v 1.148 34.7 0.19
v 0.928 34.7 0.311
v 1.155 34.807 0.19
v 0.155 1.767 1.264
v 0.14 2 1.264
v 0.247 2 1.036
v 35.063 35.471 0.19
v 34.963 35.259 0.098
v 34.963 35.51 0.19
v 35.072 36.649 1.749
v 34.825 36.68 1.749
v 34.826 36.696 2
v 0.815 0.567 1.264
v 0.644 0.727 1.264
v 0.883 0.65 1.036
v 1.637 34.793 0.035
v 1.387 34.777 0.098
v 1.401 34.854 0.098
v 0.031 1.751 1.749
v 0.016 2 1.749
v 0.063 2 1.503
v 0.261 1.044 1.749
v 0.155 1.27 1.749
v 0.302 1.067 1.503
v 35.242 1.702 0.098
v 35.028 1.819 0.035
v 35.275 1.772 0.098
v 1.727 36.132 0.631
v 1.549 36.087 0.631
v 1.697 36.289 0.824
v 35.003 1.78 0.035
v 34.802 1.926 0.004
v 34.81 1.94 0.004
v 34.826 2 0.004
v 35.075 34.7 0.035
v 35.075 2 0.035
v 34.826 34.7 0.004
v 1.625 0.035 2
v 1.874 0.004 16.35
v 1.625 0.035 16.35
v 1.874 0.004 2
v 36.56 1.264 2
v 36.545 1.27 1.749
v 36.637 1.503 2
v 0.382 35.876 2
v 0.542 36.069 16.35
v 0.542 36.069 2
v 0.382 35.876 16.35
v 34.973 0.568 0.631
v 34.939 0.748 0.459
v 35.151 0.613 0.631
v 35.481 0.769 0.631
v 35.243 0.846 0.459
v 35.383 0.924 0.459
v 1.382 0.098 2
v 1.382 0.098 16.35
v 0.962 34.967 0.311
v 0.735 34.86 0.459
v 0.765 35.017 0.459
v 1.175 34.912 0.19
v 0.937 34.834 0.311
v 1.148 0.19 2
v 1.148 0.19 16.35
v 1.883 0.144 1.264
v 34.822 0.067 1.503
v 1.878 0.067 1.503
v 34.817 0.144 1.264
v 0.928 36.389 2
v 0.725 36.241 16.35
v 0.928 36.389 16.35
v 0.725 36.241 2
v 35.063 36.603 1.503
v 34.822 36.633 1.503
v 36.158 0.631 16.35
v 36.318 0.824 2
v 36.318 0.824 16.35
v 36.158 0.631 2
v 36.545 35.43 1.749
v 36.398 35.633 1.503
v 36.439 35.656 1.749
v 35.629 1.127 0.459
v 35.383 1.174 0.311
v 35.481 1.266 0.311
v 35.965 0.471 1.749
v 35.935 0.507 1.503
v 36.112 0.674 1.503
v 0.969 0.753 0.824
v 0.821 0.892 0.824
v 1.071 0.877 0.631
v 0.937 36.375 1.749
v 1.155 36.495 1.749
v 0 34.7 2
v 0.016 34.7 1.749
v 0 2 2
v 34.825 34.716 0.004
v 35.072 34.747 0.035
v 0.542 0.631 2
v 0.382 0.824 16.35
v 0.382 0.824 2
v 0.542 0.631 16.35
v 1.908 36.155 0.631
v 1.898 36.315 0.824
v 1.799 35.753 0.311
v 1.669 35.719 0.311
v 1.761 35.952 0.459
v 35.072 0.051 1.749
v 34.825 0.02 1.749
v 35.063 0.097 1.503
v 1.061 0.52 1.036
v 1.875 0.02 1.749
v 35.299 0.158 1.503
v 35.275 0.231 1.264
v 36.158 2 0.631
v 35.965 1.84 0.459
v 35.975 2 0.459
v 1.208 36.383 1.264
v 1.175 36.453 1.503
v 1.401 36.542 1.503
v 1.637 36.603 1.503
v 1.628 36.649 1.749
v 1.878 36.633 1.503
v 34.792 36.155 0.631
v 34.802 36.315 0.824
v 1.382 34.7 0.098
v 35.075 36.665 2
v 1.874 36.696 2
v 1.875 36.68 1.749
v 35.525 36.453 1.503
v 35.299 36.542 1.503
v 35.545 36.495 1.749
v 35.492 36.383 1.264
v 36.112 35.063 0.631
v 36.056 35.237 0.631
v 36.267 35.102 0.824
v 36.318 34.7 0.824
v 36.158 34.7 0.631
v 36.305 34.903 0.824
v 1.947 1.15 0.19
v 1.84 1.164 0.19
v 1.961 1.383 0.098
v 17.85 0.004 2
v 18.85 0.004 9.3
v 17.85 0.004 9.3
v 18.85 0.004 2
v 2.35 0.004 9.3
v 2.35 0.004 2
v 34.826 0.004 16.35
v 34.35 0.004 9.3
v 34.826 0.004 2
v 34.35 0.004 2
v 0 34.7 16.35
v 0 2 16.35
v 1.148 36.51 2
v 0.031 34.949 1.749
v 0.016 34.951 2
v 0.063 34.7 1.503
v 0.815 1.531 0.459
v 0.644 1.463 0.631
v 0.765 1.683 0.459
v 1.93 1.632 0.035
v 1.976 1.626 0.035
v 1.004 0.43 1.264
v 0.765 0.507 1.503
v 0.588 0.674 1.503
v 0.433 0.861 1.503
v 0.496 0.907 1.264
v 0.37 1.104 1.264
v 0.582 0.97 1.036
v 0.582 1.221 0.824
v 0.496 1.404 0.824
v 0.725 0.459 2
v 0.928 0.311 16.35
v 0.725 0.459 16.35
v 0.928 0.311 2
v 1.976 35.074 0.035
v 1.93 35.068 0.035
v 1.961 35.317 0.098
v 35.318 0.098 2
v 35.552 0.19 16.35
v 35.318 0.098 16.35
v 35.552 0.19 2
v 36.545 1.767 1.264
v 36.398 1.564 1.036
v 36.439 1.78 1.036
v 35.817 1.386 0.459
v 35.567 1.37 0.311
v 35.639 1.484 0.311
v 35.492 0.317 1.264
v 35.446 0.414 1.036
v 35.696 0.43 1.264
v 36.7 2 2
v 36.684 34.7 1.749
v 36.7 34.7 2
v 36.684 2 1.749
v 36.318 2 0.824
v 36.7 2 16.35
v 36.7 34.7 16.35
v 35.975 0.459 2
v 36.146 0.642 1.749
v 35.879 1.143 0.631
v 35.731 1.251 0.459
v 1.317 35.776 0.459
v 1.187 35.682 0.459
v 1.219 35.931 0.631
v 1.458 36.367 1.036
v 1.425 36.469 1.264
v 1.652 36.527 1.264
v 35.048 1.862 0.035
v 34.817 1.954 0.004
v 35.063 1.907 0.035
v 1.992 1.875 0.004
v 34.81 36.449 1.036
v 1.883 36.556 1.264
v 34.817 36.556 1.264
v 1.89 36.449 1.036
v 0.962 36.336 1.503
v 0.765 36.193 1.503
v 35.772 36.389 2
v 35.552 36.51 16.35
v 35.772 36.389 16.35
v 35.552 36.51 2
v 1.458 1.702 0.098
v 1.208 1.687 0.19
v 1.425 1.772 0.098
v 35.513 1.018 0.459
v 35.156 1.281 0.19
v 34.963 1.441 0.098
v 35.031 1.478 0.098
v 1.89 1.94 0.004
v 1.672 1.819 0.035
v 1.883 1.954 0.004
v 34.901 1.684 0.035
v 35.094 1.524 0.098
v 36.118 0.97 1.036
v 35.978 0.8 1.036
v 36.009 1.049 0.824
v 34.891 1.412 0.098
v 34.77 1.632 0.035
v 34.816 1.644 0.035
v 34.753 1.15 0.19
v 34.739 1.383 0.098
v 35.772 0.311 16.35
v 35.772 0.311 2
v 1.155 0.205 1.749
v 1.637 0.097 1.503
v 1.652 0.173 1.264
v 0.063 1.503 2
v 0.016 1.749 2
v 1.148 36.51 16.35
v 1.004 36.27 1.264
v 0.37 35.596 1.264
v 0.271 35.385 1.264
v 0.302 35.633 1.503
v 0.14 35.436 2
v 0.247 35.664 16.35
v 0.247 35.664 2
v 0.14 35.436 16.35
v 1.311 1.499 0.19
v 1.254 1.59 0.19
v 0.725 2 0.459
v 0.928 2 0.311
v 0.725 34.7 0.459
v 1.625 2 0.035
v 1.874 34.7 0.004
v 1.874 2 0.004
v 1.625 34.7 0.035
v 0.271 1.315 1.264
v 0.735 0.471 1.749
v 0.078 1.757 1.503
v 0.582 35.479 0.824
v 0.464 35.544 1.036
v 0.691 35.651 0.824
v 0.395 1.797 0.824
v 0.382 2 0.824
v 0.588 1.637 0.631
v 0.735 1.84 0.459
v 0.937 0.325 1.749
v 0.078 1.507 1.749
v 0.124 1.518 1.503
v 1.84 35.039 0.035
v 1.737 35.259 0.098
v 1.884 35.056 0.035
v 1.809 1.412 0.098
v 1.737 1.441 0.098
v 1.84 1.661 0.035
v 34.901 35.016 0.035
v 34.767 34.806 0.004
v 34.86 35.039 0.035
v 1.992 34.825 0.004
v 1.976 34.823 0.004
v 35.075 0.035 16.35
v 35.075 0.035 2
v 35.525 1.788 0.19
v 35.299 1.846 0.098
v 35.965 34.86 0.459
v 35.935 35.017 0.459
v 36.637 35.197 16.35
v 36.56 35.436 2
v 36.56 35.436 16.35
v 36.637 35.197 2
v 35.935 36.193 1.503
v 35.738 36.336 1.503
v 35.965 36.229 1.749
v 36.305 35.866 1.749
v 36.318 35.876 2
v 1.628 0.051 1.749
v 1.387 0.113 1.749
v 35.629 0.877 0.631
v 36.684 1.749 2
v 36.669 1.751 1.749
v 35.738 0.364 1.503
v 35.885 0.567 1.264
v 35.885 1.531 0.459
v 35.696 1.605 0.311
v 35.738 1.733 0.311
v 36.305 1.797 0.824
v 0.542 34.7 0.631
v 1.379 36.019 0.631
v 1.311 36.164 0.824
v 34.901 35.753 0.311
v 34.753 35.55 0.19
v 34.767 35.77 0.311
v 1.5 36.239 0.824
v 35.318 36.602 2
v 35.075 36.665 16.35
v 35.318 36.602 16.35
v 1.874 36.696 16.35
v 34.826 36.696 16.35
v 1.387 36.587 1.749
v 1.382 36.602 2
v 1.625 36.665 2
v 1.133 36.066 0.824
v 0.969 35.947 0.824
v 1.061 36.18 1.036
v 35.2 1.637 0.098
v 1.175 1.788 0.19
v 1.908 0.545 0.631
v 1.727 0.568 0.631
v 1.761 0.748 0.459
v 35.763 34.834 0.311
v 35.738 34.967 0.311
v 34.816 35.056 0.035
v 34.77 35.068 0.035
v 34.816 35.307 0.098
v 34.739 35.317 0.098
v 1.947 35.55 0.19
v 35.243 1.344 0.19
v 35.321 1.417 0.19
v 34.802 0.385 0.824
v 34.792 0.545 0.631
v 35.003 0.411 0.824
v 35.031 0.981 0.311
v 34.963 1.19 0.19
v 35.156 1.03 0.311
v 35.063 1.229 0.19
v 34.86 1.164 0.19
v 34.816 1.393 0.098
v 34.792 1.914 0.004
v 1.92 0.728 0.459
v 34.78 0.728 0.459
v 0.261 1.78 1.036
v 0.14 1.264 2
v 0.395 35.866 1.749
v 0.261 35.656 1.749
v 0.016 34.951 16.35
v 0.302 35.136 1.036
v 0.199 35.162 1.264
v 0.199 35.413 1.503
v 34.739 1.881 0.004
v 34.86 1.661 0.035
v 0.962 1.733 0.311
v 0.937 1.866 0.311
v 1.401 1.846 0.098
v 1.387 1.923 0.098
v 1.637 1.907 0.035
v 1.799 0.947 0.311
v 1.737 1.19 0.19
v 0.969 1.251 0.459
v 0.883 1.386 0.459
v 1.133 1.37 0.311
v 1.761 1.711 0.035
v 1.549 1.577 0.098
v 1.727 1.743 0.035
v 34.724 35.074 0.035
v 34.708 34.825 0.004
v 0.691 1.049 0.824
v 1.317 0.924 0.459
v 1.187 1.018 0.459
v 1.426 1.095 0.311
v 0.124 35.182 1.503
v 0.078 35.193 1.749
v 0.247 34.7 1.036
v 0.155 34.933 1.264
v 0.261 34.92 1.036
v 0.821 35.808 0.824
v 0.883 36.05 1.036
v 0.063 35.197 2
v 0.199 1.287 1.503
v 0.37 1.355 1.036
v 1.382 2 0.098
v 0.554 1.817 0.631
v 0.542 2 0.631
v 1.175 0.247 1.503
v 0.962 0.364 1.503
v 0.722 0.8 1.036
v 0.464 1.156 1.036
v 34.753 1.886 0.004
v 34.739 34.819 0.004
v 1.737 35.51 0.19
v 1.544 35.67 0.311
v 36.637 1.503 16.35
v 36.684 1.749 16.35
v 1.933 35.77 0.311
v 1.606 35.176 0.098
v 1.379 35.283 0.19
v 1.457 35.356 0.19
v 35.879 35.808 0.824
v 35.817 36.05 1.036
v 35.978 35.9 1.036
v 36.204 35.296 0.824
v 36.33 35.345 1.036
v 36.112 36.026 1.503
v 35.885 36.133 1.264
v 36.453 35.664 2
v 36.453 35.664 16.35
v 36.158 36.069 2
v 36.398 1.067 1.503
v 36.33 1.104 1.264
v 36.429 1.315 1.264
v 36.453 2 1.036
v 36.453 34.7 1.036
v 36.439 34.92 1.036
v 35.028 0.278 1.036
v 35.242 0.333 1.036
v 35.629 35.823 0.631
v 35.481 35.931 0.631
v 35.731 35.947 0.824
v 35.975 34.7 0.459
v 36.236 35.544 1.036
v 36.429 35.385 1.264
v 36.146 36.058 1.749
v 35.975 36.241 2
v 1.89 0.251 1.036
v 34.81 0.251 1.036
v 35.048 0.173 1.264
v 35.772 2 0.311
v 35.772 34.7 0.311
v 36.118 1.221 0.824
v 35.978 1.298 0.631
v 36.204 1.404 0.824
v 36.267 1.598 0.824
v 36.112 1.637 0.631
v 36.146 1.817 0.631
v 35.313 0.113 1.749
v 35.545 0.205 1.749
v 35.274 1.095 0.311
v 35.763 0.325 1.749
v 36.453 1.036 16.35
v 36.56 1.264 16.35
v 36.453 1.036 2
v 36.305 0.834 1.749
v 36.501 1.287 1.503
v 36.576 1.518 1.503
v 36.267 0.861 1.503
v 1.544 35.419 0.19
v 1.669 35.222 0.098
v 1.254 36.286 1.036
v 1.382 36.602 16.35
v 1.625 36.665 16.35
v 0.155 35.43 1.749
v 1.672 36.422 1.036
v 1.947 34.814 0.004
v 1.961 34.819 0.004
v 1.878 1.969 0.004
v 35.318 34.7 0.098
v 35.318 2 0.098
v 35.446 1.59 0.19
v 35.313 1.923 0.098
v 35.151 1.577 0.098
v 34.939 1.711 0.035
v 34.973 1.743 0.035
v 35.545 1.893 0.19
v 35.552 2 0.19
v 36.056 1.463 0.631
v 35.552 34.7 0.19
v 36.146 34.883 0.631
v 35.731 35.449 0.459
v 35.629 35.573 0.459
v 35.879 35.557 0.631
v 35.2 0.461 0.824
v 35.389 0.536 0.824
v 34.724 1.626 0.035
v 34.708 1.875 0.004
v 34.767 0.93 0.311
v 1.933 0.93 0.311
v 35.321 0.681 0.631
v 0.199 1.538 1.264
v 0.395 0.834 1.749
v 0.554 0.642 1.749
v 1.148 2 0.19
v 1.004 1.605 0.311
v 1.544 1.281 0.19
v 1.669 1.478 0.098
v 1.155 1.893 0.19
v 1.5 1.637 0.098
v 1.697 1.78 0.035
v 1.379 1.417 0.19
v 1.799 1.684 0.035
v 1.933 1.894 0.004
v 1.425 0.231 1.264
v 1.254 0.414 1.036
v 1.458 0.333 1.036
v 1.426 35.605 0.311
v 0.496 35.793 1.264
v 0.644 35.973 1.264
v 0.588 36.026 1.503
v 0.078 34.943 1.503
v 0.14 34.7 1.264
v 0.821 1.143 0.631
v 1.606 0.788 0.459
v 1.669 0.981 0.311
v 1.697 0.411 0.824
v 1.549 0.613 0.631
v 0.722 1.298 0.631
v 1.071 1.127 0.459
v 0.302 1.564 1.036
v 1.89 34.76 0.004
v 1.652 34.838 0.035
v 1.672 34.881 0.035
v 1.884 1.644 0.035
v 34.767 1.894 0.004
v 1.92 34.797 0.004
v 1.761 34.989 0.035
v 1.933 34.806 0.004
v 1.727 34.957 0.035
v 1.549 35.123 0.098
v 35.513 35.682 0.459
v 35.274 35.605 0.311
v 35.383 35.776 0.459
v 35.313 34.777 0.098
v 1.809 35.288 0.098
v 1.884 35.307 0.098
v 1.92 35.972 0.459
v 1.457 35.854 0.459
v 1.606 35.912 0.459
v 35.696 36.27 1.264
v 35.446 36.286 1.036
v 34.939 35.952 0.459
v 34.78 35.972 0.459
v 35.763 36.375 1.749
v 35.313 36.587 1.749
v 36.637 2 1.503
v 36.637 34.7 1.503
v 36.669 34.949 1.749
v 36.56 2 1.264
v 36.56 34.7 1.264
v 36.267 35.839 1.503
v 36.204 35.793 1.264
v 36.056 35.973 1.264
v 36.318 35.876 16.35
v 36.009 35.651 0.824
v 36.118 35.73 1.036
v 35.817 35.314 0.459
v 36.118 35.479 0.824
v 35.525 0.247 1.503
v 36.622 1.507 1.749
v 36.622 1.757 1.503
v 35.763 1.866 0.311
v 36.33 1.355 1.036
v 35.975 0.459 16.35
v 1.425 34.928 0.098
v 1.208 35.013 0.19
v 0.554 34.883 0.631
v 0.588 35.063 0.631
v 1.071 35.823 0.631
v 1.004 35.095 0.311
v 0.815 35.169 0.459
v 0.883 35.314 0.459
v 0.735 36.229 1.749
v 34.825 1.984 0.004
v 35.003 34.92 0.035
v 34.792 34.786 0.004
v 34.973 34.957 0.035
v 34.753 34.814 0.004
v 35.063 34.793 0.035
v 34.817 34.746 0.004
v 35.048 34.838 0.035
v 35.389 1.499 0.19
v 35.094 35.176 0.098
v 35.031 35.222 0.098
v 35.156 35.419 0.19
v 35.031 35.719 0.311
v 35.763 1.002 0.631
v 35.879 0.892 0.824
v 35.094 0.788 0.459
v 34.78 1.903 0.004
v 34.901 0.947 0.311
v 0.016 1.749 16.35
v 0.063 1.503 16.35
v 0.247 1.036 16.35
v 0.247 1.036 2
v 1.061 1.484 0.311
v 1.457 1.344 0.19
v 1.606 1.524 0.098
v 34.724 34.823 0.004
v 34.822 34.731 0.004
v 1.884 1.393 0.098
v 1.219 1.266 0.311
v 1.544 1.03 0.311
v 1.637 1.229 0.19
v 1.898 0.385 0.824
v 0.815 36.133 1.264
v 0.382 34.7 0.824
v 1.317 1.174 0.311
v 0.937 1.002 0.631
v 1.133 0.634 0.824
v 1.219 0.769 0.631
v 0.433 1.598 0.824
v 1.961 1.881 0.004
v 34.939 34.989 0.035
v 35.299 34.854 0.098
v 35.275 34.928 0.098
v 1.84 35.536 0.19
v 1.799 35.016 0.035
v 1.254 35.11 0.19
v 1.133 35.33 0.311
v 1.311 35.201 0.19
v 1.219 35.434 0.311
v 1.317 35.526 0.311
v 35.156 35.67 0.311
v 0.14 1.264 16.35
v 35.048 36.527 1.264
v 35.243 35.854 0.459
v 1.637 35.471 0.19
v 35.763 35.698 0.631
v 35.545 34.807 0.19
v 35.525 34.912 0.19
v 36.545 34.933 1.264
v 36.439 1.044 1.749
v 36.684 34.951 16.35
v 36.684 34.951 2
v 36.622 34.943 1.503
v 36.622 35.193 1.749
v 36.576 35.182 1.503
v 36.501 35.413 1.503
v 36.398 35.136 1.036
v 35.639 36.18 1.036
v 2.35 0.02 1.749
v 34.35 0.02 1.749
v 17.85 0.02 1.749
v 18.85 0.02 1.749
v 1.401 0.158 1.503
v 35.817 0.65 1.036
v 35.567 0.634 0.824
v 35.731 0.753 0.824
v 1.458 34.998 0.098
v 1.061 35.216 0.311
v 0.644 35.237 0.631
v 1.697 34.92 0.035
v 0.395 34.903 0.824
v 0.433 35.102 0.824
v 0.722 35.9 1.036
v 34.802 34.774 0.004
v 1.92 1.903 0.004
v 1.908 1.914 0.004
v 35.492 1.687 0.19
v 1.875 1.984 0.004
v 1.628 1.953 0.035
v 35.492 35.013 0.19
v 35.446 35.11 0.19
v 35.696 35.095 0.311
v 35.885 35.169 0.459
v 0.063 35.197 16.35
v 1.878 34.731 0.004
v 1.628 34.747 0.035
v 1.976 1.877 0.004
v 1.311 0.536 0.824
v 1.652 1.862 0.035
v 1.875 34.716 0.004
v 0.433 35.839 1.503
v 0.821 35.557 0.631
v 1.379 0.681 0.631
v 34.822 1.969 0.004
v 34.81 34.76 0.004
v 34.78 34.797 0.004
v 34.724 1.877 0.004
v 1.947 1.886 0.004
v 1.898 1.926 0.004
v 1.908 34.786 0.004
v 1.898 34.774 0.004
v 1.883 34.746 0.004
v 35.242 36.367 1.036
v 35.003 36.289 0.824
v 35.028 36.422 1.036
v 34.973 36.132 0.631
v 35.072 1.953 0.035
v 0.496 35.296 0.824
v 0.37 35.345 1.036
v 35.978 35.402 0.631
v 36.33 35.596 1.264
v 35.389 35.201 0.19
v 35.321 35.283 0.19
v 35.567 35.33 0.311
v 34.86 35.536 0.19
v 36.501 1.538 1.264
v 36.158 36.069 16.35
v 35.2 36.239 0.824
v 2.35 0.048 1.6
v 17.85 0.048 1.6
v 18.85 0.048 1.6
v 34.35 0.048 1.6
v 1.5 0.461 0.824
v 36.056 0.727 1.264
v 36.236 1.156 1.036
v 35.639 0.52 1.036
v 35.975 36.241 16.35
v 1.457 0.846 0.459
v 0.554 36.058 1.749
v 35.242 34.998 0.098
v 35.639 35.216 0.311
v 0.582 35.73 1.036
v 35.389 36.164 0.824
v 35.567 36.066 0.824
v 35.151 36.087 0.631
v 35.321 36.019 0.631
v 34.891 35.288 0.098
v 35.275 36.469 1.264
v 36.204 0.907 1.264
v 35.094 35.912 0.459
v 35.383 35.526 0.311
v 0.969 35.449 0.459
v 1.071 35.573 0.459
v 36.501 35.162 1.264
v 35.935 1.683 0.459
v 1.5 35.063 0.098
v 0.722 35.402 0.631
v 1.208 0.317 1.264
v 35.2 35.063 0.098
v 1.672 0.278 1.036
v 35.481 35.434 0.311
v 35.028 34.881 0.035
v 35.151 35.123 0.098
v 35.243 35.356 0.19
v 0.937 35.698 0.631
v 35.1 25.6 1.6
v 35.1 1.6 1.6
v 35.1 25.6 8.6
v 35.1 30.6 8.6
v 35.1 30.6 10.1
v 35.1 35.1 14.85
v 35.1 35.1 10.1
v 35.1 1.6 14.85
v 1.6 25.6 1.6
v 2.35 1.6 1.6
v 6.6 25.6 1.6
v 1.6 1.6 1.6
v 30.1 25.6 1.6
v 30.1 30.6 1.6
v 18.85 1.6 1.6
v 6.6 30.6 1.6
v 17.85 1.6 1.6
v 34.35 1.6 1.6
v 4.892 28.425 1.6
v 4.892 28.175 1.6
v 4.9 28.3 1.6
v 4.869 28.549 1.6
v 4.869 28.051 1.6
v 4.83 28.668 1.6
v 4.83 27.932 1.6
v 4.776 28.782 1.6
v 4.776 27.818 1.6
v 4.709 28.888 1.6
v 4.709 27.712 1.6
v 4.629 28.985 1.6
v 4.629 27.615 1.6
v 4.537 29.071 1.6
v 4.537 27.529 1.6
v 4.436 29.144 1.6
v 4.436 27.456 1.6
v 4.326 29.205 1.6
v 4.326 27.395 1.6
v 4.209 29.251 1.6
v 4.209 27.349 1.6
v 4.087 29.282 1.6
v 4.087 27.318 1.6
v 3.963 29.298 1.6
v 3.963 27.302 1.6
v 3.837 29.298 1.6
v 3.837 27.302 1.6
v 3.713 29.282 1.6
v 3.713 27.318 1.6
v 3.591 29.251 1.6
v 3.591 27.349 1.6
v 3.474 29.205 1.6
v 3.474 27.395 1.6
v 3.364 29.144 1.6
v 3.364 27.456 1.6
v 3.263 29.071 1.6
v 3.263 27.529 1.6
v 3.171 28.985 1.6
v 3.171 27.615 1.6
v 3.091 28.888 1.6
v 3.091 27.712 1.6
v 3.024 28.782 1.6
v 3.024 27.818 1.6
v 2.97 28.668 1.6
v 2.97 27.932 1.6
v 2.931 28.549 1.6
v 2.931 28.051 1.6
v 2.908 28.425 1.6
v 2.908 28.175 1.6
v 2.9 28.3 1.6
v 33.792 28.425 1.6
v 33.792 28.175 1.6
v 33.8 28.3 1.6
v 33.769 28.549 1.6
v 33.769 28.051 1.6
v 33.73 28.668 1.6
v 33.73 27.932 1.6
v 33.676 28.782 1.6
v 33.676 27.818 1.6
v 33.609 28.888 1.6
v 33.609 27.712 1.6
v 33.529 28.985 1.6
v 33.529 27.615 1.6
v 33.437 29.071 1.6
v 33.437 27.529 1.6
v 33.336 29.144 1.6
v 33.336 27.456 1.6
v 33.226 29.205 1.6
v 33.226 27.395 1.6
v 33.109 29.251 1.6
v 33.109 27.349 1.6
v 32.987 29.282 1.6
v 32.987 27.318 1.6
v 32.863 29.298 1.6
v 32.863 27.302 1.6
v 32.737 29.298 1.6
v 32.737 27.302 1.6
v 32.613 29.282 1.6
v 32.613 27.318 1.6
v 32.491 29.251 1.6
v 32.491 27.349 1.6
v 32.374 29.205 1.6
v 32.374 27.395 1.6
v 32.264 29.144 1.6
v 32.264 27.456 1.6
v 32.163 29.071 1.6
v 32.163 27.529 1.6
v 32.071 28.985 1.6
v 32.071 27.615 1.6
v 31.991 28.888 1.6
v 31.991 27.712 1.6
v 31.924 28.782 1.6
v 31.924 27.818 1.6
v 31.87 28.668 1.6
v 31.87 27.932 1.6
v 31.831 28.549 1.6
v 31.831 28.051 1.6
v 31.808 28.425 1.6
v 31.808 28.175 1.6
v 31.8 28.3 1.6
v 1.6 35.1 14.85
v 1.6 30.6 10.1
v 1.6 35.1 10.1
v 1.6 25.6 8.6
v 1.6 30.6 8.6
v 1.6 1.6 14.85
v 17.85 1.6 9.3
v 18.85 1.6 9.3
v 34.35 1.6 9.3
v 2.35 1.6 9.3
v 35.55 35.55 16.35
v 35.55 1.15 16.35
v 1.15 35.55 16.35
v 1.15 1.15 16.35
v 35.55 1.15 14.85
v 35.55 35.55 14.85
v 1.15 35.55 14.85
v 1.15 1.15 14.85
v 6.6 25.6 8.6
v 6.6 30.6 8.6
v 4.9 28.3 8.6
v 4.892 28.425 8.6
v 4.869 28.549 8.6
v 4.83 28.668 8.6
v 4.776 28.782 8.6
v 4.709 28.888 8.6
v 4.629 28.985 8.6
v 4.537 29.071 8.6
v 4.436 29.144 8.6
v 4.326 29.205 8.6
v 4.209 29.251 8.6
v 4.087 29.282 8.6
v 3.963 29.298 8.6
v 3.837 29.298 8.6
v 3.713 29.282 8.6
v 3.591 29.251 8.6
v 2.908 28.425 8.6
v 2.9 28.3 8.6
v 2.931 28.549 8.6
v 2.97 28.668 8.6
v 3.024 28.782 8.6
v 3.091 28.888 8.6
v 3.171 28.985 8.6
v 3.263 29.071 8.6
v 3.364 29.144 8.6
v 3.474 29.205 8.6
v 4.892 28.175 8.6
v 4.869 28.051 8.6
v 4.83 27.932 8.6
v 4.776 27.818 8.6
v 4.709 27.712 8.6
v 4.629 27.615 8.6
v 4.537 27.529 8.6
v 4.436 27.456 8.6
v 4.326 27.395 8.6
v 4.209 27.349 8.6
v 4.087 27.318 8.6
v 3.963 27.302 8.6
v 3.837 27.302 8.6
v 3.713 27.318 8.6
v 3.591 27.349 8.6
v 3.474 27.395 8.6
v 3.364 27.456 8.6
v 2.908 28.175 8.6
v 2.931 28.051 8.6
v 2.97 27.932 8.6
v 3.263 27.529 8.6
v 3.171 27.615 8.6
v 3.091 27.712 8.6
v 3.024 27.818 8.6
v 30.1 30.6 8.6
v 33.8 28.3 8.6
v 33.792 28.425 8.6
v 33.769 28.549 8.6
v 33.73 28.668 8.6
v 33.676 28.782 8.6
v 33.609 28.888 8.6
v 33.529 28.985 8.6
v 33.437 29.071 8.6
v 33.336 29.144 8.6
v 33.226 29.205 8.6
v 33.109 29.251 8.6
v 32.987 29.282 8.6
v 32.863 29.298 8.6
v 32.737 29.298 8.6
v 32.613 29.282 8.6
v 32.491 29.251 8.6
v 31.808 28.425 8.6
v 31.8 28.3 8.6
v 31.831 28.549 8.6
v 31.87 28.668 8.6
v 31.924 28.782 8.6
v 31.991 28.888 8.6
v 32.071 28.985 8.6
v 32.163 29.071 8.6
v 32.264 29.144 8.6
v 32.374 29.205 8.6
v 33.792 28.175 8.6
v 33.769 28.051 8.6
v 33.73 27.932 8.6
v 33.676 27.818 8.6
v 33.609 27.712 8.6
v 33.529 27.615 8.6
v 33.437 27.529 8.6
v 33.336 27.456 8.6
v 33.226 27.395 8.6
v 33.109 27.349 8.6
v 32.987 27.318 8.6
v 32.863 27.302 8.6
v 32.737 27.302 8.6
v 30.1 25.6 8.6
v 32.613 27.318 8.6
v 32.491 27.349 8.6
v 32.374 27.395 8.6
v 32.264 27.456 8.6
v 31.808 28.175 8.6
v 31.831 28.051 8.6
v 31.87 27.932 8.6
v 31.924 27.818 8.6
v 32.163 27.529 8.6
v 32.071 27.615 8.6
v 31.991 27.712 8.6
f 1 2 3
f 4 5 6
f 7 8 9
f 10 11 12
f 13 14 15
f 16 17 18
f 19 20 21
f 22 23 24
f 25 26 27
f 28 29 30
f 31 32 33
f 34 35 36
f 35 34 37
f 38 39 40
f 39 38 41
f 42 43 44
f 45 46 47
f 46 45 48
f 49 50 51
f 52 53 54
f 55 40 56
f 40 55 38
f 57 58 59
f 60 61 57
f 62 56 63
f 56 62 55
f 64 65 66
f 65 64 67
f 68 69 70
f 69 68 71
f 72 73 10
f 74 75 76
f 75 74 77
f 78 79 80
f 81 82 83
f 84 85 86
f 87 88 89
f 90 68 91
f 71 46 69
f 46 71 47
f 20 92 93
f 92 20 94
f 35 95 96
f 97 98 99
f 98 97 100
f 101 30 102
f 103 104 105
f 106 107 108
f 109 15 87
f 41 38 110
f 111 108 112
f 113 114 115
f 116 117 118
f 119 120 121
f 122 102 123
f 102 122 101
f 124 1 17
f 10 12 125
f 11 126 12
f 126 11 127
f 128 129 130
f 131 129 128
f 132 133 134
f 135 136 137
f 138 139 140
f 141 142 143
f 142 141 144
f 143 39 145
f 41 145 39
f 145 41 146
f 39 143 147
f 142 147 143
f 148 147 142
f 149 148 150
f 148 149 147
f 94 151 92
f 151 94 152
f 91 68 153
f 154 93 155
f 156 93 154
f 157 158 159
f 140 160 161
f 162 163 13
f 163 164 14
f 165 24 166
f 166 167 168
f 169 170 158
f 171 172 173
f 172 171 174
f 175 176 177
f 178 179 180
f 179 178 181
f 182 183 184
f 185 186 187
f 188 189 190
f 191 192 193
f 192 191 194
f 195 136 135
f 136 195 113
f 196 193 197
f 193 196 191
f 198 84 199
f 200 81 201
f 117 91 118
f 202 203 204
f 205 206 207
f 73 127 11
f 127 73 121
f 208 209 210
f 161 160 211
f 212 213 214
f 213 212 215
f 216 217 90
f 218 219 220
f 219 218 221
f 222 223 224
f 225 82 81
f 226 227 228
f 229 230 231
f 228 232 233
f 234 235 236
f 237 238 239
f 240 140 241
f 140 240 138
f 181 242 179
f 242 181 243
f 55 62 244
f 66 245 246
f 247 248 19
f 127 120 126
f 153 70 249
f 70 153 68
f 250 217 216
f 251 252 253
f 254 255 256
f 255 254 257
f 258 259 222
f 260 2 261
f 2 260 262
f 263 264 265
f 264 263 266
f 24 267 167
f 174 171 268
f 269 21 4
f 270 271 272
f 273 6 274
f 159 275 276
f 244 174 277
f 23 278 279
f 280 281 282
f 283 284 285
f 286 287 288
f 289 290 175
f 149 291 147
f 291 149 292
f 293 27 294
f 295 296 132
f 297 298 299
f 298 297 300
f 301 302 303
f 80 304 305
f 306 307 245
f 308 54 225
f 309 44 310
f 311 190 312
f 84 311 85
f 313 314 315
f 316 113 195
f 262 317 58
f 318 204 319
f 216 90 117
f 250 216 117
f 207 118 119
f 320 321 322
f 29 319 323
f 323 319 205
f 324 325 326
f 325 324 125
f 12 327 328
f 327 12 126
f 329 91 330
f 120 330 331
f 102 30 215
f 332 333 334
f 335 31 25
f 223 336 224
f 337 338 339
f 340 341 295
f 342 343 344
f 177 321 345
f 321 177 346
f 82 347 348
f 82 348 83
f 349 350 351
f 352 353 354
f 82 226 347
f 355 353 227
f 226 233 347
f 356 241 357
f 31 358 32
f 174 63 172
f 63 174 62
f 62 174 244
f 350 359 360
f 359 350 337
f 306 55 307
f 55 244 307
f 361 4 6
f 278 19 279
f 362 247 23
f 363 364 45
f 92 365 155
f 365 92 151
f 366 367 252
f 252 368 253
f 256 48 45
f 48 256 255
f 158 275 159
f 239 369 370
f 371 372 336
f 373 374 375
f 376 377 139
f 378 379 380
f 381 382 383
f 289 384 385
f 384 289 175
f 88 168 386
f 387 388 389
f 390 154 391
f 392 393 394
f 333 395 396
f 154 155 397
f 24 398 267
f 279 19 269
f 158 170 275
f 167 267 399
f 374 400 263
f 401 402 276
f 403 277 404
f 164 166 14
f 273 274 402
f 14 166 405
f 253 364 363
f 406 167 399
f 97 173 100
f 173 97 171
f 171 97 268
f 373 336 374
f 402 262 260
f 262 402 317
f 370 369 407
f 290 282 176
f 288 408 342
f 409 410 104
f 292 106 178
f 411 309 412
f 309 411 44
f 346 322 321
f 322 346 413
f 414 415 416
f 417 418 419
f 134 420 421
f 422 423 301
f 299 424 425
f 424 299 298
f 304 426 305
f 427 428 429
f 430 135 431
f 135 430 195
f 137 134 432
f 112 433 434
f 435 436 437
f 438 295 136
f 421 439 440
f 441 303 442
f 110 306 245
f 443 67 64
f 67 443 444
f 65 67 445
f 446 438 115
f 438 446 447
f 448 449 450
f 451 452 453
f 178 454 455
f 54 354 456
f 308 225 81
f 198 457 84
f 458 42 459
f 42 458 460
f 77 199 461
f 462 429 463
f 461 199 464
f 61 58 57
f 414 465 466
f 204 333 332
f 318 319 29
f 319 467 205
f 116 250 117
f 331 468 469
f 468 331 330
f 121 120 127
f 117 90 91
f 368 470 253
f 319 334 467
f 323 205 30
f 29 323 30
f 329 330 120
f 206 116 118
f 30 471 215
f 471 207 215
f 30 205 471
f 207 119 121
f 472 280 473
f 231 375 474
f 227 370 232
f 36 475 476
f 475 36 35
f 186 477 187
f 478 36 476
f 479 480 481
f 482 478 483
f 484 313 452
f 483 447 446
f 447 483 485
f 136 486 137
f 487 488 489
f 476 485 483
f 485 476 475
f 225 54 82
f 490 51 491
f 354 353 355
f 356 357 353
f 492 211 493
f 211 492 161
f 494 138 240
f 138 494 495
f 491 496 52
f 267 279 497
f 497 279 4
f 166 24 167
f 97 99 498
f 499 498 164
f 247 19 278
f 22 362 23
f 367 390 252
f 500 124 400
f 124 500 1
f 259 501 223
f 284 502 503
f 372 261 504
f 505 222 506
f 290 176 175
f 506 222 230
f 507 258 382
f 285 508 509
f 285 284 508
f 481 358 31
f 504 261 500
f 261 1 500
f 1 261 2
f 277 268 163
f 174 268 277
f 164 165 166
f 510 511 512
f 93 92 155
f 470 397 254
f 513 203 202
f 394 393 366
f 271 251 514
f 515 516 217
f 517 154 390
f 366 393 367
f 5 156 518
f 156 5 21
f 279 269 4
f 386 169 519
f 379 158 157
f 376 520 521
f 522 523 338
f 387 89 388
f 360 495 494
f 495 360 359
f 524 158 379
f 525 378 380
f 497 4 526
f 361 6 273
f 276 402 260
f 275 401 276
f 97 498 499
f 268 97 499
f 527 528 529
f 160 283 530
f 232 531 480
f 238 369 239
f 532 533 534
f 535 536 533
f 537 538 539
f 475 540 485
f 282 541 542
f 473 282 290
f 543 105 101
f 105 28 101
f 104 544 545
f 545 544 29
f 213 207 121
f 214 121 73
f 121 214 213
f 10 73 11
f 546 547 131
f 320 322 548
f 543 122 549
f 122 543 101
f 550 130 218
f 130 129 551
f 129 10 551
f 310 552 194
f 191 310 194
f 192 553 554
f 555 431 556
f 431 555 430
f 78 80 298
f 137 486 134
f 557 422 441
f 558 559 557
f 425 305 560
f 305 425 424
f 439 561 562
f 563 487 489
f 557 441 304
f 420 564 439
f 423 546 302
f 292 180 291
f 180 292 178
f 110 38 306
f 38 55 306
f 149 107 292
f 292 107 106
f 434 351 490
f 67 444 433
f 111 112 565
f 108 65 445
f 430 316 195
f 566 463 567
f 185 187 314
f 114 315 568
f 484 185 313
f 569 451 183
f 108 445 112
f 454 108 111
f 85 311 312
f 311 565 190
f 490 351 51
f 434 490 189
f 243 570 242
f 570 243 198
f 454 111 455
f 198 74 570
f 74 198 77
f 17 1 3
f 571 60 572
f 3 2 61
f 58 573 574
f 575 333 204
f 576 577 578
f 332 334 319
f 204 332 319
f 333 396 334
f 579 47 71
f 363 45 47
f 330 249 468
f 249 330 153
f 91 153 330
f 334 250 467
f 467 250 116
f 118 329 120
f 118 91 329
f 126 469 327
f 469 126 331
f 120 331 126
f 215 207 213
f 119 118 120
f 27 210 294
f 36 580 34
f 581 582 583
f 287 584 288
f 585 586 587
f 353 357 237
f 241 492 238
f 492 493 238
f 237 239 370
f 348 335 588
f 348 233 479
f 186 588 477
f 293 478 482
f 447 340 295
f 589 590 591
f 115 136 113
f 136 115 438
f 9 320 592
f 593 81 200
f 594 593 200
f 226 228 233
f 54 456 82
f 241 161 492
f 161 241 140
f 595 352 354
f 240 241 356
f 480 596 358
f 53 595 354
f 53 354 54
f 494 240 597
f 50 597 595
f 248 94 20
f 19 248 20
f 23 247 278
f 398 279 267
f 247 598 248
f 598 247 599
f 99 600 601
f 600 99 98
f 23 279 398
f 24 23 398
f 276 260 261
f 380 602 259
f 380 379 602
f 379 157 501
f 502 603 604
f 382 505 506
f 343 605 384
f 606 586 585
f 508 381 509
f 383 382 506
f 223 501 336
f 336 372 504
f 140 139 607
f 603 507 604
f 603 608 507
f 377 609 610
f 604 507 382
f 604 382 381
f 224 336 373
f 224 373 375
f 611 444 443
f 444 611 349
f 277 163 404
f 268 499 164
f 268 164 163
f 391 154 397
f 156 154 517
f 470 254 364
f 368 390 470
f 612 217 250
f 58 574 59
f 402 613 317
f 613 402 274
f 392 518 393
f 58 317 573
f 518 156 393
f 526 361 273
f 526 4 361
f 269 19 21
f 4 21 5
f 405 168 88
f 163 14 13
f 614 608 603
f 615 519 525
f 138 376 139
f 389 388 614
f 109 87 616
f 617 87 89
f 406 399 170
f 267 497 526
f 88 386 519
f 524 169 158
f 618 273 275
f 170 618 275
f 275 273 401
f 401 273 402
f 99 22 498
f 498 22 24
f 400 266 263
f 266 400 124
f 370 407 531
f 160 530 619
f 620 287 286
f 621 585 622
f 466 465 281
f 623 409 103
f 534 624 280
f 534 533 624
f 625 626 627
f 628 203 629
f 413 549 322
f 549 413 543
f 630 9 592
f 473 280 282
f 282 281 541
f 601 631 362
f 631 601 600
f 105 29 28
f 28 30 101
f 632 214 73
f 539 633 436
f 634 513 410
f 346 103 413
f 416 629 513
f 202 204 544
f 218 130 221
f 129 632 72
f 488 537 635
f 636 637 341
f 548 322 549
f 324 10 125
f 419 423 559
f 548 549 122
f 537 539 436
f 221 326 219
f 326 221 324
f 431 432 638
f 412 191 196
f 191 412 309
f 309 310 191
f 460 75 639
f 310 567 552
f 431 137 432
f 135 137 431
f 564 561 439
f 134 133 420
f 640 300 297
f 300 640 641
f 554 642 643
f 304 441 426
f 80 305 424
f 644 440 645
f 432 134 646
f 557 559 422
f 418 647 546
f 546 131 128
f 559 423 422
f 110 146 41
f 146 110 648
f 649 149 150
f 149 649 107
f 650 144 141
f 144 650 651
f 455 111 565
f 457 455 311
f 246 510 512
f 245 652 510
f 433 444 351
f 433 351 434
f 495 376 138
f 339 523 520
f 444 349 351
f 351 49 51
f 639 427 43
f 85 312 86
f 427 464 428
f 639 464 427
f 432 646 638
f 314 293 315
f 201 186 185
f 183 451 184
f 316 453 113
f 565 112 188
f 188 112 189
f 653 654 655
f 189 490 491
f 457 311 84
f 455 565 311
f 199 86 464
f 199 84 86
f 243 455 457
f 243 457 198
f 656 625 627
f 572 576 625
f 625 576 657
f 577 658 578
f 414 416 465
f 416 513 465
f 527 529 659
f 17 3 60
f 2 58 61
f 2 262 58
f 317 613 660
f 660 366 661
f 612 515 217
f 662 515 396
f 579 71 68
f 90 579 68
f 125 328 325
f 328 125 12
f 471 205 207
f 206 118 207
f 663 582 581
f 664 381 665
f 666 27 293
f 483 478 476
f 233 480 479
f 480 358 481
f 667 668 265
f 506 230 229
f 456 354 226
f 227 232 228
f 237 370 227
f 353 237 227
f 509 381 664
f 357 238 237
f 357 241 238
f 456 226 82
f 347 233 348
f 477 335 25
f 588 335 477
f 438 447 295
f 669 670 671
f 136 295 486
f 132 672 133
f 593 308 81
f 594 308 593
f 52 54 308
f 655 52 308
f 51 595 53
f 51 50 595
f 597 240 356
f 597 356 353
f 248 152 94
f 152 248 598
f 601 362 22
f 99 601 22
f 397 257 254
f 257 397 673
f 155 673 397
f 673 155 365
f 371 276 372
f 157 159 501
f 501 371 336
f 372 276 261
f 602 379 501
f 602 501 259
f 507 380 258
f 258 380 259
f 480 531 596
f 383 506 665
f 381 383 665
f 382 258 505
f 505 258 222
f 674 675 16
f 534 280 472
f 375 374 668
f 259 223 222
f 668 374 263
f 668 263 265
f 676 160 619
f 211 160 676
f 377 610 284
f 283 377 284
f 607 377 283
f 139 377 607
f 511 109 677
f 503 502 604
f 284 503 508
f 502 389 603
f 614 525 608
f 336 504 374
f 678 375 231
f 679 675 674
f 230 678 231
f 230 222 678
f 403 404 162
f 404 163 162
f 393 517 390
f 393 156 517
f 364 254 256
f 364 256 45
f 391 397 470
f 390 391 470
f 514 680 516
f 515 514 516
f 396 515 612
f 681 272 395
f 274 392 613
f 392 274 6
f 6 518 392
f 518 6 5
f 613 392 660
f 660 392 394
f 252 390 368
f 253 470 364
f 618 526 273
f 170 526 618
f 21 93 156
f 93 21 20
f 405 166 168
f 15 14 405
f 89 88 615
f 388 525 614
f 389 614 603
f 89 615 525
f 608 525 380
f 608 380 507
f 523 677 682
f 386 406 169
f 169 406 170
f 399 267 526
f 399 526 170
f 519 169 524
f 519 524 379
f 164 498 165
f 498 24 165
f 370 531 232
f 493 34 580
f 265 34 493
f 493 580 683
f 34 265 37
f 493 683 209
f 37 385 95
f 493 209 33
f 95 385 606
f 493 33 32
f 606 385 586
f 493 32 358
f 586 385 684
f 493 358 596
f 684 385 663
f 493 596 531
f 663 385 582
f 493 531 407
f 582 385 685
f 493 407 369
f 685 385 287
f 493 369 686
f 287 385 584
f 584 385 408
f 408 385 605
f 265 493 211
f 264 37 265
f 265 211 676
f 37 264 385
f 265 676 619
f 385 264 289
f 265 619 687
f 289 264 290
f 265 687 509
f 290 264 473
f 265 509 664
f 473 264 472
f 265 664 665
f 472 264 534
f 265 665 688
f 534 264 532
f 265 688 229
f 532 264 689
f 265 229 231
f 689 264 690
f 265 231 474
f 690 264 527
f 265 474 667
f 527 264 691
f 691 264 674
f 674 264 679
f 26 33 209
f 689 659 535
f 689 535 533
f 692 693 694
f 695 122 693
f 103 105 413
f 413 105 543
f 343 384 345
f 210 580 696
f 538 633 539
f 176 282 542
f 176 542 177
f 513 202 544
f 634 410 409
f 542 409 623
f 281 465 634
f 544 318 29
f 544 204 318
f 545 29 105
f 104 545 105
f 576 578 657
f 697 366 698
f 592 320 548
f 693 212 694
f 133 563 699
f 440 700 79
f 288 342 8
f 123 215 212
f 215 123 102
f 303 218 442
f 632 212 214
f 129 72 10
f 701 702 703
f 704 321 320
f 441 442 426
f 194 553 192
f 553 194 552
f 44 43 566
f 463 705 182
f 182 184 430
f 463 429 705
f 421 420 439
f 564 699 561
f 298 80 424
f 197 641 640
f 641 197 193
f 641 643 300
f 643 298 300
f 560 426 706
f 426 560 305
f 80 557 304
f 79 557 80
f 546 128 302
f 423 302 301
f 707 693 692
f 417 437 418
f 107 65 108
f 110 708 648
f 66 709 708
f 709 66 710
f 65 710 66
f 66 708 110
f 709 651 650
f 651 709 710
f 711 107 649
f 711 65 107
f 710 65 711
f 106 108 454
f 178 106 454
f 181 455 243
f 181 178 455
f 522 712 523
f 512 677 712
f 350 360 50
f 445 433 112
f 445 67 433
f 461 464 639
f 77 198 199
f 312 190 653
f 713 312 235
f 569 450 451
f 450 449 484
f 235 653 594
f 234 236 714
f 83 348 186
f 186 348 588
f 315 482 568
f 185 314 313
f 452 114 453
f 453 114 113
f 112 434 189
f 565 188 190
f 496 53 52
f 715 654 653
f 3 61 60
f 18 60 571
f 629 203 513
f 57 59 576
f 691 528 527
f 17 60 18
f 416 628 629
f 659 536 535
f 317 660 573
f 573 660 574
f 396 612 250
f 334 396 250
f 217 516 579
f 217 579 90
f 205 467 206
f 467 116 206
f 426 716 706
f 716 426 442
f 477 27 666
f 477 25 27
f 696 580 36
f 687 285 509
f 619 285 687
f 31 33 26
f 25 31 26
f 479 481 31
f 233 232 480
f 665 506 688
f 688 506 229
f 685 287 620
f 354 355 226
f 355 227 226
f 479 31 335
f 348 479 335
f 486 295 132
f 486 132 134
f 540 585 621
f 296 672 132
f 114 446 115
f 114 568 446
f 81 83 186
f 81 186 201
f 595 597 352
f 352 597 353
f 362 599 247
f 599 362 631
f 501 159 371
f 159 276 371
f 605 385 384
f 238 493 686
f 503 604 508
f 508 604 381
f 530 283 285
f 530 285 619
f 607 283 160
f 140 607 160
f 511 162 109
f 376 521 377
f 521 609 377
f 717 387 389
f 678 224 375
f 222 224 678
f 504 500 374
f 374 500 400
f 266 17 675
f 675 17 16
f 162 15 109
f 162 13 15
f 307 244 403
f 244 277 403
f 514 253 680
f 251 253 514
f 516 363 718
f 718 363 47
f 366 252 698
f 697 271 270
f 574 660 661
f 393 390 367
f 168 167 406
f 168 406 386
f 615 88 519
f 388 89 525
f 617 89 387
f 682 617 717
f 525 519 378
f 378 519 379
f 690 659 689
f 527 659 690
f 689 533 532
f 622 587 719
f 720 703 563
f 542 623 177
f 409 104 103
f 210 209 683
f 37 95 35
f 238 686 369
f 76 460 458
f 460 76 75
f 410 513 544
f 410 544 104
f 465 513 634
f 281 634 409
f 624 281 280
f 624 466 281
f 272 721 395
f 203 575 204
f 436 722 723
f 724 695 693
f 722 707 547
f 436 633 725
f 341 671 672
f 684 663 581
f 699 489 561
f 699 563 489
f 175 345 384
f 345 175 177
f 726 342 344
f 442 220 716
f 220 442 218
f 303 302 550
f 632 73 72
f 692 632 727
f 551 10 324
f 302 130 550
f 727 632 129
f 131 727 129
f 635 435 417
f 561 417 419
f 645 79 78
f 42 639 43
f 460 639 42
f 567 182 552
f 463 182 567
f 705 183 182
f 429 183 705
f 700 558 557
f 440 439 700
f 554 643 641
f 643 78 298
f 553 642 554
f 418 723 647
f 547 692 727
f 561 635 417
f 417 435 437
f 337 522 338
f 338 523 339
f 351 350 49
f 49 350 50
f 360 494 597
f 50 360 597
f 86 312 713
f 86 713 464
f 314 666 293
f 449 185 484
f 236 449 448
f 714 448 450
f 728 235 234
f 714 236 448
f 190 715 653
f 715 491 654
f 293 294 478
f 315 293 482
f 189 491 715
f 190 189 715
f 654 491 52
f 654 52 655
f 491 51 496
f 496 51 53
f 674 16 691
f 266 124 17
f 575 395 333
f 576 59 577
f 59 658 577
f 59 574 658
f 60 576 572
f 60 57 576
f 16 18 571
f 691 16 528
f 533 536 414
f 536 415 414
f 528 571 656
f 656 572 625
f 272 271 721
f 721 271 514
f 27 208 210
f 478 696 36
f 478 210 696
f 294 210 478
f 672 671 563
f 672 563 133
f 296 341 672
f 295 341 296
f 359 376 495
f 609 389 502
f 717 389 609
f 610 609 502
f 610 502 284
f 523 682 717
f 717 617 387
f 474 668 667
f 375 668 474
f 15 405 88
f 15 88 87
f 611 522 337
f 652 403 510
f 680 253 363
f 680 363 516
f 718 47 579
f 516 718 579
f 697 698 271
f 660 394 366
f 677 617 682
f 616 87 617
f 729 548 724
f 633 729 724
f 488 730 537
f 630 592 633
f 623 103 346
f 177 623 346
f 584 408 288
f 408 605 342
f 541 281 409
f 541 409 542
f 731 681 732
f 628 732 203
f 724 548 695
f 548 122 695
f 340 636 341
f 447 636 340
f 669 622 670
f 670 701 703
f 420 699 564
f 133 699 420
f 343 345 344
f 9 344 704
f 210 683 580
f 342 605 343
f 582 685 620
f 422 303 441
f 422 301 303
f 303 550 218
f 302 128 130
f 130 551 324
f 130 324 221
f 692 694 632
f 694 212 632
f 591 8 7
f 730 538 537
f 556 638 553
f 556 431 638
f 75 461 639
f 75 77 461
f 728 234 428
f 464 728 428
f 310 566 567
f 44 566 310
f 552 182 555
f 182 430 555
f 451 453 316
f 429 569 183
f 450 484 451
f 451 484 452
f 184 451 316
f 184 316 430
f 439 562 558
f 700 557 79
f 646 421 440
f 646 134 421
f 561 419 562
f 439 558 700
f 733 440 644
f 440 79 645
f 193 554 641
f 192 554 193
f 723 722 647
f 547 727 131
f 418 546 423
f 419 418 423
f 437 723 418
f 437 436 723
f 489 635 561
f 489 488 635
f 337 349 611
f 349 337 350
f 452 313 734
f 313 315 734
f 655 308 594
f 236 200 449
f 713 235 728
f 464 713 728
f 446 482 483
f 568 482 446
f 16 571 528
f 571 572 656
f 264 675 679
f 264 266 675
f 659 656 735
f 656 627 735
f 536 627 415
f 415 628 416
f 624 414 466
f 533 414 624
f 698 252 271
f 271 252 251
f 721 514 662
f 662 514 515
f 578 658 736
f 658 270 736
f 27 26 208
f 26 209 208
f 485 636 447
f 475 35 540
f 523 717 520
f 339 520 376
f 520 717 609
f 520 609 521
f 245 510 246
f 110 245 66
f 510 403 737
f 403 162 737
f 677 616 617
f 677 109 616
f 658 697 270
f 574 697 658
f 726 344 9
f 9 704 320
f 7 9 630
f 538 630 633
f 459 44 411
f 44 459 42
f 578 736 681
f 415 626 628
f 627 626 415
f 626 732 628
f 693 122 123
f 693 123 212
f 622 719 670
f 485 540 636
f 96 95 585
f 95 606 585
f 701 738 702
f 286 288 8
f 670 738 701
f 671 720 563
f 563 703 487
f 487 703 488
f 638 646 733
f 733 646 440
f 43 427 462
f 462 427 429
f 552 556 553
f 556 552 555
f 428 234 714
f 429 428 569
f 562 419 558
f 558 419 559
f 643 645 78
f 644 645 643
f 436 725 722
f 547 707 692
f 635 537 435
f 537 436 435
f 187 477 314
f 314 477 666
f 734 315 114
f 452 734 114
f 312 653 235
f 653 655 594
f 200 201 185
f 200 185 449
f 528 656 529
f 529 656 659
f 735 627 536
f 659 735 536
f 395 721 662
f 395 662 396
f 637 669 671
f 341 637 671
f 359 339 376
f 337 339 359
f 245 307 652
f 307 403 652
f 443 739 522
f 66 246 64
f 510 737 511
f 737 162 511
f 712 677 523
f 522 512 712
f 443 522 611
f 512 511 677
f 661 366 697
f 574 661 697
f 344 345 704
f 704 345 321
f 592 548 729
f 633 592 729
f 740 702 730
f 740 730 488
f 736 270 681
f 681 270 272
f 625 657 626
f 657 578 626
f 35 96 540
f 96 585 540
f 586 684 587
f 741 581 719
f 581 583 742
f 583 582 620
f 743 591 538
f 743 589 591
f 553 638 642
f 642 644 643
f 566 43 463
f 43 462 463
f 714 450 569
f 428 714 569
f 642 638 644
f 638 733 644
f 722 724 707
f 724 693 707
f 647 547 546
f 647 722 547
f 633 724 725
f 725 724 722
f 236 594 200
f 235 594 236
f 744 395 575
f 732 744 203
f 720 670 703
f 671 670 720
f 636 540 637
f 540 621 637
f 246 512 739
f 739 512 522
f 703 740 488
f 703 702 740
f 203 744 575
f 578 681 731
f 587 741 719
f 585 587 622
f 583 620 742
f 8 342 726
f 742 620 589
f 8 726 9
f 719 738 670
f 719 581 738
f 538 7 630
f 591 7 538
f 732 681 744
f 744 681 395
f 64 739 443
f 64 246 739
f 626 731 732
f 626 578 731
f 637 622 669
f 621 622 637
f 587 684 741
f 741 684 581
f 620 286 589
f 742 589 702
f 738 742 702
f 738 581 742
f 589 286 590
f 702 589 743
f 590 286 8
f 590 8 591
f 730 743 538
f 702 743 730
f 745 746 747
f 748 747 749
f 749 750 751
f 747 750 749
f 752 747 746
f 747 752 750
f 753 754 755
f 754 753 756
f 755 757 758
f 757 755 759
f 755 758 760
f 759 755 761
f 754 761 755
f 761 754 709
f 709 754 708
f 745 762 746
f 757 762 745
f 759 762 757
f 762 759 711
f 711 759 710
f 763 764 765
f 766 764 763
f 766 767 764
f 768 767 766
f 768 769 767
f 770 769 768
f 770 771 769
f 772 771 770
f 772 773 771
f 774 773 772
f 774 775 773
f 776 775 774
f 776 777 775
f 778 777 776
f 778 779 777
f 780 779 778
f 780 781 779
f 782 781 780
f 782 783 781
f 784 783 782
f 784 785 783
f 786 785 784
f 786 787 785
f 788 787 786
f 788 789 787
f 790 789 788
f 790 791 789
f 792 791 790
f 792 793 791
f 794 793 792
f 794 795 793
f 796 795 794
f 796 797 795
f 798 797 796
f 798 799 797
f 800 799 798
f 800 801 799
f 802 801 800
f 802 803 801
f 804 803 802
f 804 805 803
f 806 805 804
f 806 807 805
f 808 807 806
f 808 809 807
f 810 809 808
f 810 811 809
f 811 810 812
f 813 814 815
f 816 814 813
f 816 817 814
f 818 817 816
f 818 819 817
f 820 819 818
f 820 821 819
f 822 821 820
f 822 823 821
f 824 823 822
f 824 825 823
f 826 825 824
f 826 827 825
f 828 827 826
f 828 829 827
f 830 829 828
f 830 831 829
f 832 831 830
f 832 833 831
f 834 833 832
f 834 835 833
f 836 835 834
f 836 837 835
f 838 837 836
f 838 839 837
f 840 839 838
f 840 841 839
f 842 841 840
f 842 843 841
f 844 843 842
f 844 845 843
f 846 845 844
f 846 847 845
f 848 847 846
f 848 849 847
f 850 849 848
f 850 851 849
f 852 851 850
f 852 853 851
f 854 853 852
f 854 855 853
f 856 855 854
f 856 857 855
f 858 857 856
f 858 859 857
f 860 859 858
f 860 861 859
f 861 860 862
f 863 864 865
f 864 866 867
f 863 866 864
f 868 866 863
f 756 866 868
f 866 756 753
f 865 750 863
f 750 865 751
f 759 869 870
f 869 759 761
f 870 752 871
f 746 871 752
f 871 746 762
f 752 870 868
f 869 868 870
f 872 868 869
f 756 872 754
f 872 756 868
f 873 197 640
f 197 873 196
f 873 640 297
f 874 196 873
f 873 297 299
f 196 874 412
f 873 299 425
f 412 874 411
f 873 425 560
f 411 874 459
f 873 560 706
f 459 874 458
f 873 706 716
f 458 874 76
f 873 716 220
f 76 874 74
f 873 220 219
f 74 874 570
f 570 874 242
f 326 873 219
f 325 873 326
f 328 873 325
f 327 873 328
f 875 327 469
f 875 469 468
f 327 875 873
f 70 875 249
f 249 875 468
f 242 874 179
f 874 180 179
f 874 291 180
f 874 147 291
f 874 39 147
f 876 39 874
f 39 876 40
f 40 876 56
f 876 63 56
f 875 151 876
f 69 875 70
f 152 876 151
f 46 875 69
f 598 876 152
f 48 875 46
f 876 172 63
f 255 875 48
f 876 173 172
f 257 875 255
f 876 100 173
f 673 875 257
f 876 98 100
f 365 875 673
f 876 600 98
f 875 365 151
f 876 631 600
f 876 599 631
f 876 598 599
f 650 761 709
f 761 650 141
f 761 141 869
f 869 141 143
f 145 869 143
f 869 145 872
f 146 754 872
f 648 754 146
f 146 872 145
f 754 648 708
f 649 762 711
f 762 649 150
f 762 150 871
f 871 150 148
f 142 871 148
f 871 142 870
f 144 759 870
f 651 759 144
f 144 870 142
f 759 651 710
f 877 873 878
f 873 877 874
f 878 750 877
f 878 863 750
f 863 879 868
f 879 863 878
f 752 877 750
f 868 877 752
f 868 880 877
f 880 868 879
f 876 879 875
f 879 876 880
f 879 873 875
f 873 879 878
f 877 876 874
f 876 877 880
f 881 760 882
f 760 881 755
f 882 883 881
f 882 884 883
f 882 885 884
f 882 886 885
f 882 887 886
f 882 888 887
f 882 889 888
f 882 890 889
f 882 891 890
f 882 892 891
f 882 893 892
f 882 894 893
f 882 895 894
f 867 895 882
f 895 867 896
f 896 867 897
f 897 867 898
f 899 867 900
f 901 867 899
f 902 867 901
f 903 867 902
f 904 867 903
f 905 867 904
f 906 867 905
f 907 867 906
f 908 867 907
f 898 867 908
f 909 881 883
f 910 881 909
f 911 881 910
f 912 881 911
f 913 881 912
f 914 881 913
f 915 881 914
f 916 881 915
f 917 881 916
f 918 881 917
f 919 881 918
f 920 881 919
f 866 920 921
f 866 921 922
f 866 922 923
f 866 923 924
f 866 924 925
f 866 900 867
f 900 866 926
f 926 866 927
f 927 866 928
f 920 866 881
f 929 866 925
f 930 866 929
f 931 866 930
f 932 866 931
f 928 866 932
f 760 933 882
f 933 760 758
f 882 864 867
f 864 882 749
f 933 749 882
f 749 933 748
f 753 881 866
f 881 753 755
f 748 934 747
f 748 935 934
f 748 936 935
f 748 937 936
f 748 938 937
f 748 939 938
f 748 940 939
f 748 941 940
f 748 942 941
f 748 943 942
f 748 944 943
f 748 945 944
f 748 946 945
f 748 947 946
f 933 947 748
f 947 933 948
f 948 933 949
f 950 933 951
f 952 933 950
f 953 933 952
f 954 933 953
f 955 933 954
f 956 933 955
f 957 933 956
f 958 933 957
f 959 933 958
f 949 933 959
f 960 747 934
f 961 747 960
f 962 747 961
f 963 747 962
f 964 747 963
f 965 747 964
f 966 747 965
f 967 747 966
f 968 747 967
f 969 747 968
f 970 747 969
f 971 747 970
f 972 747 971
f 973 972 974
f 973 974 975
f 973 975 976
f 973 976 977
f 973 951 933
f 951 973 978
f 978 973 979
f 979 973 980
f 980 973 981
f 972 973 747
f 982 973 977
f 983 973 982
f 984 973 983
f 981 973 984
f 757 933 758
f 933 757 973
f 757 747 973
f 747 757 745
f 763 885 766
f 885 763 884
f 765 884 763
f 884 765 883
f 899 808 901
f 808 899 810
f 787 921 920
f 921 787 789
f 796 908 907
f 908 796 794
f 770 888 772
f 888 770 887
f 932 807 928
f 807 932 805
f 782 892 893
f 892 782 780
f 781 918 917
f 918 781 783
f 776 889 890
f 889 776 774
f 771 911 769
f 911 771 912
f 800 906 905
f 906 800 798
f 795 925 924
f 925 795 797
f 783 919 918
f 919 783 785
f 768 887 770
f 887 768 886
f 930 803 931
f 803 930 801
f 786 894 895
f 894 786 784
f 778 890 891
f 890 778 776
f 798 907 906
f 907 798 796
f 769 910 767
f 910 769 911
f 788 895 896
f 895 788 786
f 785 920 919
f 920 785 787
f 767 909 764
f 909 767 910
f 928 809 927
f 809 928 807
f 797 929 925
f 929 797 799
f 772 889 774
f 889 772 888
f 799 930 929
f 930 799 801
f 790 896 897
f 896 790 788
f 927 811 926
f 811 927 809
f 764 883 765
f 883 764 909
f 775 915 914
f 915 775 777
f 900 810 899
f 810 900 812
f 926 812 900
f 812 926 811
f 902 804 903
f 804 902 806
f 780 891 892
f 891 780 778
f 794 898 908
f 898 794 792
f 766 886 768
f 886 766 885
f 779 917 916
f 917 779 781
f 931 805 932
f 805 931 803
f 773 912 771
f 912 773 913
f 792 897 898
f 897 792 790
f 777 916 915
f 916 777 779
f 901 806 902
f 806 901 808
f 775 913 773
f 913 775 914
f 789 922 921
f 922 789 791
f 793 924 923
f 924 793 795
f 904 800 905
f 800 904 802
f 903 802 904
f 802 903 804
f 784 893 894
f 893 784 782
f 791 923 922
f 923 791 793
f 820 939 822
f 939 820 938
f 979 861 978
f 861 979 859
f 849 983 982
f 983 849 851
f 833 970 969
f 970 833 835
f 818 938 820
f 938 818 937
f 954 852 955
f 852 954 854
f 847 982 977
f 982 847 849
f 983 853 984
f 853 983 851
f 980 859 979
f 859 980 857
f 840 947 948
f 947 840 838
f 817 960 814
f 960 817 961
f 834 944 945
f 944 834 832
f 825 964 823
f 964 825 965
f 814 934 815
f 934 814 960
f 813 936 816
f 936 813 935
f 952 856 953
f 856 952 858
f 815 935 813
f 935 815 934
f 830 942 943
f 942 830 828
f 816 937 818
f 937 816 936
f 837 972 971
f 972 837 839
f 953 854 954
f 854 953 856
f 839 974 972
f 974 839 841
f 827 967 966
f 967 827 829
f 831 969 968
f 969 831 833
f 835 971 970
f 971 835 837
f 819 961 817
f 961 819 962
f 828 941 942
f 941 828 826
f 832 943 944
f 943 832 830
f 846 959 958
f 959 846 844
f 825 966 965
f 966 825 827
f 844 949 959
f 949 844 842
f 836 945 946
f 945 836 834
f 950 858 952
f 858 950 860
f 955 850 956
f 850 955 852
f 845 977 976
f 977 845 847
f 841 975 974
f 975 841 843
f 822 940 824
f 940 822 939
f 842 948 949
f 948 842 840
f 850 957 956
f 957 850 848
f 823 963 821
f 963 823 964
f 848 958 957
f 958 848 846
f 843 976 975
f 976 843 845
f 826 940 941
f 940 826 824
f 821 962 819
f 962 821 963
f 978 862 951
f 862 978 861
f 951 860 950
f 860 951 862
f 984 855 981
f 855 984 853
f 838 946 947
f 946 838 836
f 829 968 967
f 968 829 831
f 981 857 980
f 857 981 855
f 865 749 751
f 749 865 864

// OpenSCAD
/* [General] */
part = "bottom"; // [bottom, top]
// Size of your nozzle, multiples of this are used for wall widths
nozzle = 0.4;
// Clearance between top and bottom part
clearance = 0.05;
// Roundness of the corners
roundness = 2; // [0.1:0.1:3]

/* [5V PCB] */
boardLength = 33.5;
boardWidth = 29;
usbHeight = 7.7;
usbWidth = 15.5;
boardOffsetZ = 7;
boardHeight = 1.5;
boardScrewBase = 5;
screwOffsetX = 28.3;
screwOffsetY = 2.3;
screwRadius = 1;

usbOffset = 0.75;

/* [Battery Buzzer] */
pinOffsetZ = 5;
pinOffsetX = 0.5;
pinHeight = 3;
pinLength = 23;

displayLength = 22;
displayWidth = 12;
displayOffsetY = 6.5;
displayOffsetX = 0.25;

/* [XT60] */
xt60Wall = 0.5;
xt60Width = 8.6;
xt60Height = 16.1;
xt60TopWidth = 3;
xt60TopHeight = 3.4;
xt60Length = 16;

/* [Hidden] */
$fn=50;
side = boardLength;
walls = nozzle * 4;
sideOuter = side + walls * 2;

if(part == "bottom") {
    bottom();
}

if(part == "top") {
    top();
}

module xt60() {
    group() {
        hull() {
            cube([xt60Width, xt60Length, xt60Height - xt60TopHeight]);
        
            translate([(xt60Width - xt60TopWidth) /2,0, xt60Height - 0.1])
                cube([xt60TopWidth, xt60Length, 0.1]);
        }
        
        translate([xt60Wall, -10, xt60Wall])
        hull() {
        cube([xt60Width - xt60Wall *2, xt60Length, xt60Height - xt60TopHeight - xt60Wall * 2]);
    
        translate([(xt60Width - (xt60TopWidth - xt60Wall * 2)) / 2 - xt60Wall, 0, xt60Height - 0.1 -  xt60Wall * 2])
            cube([xt60TopWidth - xt60Wall * 2, xt60Length, 0.1]);
    }
    }
}

module top() {
    clearance = 0.1;
    connectorWidth = 0.4;
    connectorHeight = 1;

    difference() {
        baseTop(sideOuter / 2 + 2, connectorHeight);
        
        translate([walls + pinOffsetX, -1, walls + pinOffsetZ])
            cube([pinLength, walls+2, pinHeight]);
        
        translate([walls + displayOffsetX + pinOffsetX, displayOffsetY, -1])
            cube([displayLength, displayWidth, walls + 2]);
        
        translate([side + walls - xt60Width, walls/2, walls])
            xt60();
    }
    
    translate([side + walls - xt60Width, walls/2 + xt60Length, walls])
        cube([xt60Width, 2, 1.5]);
}

module baseTop(height, connectorHeight) {
    base(height);
    
    difference() {
        group() {
            translate([walls, walls, walls])
                cube([side, side, height - walls]);

            translate([nozzle * 3, nozzle * 3, walls])
                cube([side + nozzle * 2, side + nozzle * 2, height + connectorHeight - walls]);
        }

        translate([walls, walls, walls])
            cube([side, side, height + connectorHeight + 1]);
        
        translate([-1, -1, height])
            cube([5, 5, connectorHeight + 1]);
        
        translate([sideOuter - 5 + 1, -1, height])
            cube([5, 5, connectorHeight + 1]);
        
        translate([sideOuter - 5 + 1, sideOuter - 5 + 1, height])
            cube([5, 5, connectorHeight + 1]);
        
        translate([-1, sideOuter - 5 + 1, height])
            cube([5, 5, connectorHeight + 1]);
    }
}

module base(height) {
    difference(){
        hull() {
            translate([roundness, roundness, roundness])
                sphere(r=roundness);
                
            translate([sideOuter - roundness, roundness, roundness])
                sphere(r=roundness);

            translate([sideOuter - roundness, sideOuter - roundness, roundness])
                sphere(r=roundness);

            translate([roundness, sideOuter - roundness, roundness])
                sphere(r=roundness);

            translate([roundness, roundness, height])
                sphere(r=roundness);
                
            translate([sideOuter - roundness, roundness, height])
                sphere(r=roundness);

            translate([sideOuter - roundness, sideOuter - roundness, height])
                sphere(r=roundness);

            translate([roundness, sideOuter - roundness, height])
                sphere(r=roundness);
        }

        translate([walls, walls, walls])
            cube([side, side, side]);

        translate([-1, -1, height])
            cube([sideOuter + 2, sideOuter + 2, sideOuter]);
    }
}

module bottom() {
    height = sideOuter / 2 - 2;
    difference(){
        base(height);

        // USB cutouts
        translate([walls + usbOffset, walls - 2, walls])
            cube([usbWidth, walls + 2, usbHeight]);
        
        translate([walls + side - usbWidth - usbOffset, walls - 2, walls])
            cube([usbWidth, walls + 2, usbHeight]);
        
        translate([nozzle * 3 - clearance, nozzle * 3 - clearance, height-1.5])
            cube([side + (nozzle + clearance) * 2, side + (nozzle + clearance) * 2, side]);
    }
    translate([walls, walls + boardWidth, walls])
        cube([side, side-boardWidth, boardOffsetZ + boardHeight]);

    difference() {
        group() {
            translate([walls, walls + boardWidth-boardScrewBase, walls])
                cube([boardScrewBase, boardScrewBase, boardOffsetZ]);

            translate([walls + side - boardScrewBase, walls + boardWidth - boardScrewBase, walls])
                cube([boardScrewBase, boardScrewBase, boardOffsetZ]);
        }
        
        translate([walls + screwOffsetY, screwOffsetX, walls])
            cylinder(r=screwRadius, h = boardOffsetZ + 1);

        translate([walls + side - screwOffsetY, screwOffsetX, walls])
            cylinder(r=screwRadius, h = boardOffsetZ + 1);
    }
}
